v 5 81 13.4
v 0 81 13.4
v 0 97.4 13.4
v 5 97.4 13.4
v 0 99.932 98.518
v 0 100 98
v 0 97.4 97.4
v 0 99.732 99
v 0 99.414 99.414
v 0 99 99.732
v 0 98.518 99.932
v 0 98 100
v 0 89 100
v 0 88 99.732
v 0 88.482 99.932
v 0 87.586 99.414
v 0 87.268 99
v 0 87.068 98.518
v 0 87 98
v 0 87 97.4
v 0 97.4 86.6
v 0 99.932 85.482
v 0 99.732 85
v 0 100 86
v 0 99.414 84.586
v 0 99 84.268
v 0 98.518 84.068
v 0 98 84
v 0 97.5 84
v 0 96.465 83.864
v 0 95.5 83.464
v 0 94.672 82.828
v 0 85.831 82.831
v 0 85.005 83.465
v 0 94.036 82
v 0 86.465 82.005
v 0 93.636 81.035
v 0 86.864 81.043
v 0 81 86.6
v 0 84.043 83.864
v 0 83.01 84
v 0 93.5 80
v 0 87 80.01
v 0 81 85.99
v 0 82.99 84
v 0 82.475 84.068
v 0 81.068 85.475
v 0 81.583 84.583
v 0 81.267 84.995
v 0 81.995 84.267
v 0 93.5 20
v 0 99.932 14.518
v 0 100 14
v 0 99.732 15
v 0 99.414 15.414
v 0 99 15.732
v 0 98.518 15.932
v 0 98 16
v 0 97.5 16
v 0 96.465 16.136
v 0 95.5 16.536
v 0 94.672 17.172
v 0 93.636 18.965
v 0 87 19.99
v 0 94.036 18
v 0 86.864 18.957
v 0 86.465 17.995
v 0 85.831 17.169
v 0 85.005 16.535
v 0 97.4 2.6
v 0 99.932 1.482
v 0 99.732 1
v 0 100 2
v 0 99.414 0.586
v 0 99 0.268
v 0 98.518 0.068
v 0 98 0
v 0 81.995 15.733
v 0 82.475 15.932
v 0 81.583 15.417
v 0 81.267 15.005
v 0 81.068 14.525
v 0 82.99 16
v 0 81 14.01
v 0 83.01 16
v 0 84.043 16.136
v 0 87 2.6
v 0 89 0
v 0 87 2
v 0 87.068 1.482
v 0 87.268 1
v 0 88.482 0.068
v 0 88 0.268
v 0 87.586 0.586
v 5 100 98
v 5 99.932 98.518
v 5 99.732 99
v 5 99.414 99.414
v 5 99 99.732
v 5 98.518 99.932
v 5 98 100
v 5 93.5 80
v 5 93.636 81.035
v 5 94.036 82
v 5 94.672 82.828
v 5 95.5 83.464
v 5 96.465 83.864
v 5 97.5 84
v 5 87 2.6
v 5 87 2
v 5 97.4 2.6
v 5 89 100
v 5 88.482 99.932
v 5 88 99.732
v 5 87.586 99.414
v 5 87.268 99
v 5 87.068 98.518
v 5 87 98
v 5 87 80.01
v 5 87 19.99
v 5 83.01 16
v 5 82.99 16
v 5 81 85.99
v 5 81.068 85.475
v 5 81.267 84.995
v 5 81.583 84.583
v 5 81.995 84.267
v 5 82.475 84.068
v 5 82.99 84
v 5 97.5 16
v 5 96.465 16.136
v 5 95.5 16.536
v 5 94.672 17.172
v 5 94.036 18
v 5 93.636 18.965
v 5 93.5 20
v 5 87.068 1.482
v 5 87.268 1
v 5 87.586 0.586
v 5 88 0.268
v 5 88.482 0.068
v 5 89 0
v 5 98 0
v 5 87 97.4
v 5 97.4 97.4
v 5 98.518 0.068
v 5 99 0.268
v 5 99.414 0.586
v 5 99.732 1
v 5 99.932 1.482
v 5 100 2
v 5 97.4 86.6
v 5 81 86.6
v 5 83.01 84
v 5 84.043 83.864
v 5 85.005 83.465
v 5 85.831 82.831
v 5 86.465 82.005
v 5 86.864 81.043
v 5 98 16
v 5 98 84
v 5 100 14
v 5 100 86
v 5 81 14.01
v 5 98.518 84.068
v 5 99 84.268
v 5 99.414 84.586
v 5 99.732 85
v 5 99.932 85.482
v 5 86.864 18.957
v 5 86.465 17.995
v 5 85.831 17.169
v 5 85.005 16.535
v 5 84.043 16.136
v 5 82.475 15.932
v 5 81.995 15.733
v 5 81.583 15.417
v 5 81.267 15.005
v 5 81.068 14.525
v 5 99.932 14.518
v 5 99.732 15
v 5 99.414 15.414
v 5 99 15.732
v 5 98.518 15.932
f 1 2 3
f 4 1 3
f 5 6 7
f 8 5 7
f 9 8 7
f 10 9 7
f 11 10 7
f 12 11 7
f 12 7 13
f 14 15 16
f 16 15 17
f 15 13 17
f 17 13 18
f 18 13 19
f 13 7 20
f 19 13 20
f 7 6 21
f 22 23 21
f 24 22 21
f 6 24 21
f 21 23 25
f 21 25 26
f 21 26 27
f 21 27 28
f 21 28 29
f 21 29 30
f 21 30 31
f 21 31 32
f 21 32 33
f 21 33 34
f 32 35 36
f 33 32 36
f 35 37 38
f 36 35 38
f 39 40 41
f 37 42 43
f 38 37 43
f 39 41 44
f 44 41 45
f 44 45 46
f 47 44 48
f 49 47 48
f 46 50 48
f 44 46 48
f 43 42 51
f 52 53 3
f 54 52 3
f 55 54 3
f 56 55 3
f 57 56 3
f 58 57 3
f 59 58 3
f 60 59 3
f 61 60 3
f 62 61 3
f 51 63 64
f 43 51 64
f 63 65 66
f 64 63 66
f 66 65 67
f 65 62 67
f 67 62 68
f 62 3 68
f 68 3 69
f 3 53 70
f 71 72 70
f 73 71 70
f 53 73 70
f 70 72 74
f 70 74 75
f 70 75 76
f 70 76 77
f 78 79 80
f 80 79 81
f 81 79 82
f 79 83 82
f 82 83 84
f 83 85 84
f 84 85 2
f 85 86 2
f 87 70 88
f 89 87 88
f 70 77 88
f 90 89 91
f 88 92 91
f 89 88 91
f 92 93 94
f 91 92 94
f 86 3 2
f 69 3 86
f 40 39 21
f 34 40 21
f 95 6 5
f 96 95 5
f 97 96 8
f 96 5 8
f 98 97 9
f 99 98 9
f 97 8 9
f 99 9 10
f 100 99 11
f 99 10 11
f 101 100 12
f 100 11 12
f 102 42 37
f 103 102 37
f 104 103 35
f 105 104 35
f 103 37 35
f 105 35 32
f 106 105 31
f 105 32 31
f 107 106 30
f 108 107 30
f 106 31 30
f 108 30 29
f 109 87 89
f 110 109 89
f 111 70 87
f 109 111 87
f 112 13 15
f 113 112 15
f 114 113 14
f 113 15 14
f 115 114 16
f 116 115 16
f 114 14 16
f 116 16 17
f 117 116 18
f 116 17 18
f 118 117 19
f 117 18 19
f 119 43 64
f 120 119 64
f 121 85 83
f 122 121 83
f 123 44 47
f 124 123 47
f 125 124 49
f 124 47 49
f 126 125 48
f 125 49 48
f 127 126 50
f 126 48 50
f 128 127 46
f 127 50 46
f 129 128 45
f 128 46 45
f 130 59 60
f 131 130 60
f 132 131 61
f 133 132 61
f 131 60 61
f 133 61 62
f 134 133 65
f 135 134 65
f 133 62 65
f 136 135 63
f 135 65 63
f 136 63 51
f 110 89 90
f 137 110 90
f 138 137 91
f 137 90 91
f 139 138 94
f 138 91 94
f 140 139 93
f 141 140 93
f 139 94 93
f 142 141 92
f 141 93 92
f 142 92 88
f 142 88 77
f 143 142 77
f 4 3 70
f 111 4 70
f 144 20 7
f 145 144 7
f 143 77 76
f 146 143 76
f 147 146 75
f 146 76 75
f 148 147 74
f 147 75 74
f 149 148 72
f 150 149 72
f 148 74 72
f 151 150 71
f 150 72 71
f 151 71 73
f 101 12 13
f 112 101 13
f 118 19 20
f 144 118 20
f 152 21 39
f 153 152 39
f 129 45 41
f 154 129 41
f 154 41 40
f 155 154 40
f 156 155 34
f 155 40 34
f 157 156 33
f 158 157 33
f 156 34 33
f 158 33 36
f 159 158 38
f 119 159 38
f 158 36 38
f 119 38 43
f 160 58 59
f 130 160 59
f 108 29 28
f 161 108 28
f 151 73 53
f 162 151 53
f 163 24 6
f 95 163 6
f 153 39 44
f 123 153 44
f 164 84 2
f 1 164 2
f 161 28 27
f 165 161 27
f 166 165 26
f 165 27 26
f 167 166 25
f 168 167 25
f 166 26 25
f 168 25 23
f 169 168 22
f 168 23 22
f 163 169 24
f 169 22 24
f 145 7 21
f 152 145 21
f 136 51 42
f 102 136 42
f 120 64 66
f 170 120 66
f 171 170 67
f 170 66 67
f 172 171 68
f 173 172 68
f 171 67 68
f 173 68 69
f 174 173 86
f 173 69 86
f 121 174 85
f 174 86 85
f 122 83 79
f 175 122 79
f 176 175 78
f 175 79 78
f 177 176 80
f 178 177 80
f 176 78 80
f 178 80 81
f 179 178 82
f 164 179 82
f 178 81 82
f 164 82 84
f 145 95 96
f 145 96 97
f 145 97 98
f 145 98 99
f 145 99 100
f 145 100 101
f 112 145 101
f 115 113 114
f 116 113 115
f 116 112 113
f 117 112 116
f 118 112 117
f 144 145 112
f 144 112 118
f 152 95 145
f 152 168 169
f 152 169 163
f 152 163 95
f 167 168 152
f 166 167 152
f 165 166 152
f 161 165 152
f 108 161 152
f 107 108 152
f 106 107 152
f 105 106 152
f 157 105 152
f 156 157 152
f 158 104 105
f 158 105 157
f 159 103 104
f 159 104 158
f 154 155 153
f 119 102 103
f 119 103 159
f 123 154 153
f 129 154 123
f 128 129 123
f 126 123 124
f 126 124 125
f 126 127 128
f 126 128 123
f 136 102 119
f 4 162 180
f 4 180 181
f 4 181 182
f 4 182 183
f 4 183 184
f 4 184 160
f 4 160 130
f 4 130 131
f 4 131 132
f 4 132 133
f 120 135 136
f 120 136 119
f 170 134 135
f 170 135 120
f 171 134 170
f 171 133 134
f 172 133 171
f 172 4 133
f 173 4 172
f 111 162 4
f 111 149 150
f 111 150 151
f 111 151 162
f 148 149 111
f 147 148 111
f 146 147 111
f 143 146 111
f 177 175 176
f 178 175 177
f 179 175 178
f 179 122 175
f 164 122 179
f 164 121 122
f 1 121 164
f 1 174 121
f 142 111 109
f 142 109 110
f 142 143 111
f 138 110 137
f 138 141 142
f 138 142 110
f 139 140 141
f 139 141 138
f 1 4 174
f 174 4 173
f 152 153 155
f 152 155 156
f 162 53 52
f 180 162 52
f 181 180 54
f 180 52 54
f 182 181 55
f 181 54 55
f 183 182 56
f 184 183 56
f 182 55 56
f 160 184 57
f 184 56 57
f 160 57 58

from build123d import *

# Parameters (mm, degrees)
BOSS_EXTRUDE1_DEPTH = 5


with BuildPart() as part:
    # Sketch1 → Boss-Extrude1 (new body)
    with BuildSketch(Plane(origin=(0, 0, 0), x_dir=(0, -1, 0), z_dir=(1, 0, 0))):
        with BuildLine():
            Line((-81, -13.4), (-87, -13.4))
            Line((-87, -13.4), (-97.4, -13.4))
            Line((-97.4, -13.4), (-97.4, -2.6))
            Line((-97.4, -2.6), (-87, -2.6))
            Line((-87, -2.6), (-87, -2))
            ThreePointArc((-87, -2), (-87.585786438, -0.585786438), (-89, 0))
            Line((-89, 0), (-98, 0))
            ThreePointArc((-98, 0), (-99.414213562, -0.585786438), (-100, -2))
            Line((-100, -2), (-100, -14))
            ThreePointArc((-100, -14), (-99.414213562, -15.414213562), (-98, -16))
            Line((-98, -16), (-97.5, -16))
            ThreePointArc((-97.5, -16), (-94.671572875, -17.171572875), (-93.5, -20))
            Line((-93.5, -20), (-93.5, -80))
            ThreePointArc((-93.5, -80), (-94.671572875, -82.828427125), (-97.5, -84))
            Line((-97.5, -84), (-98, -84))
            ThreePointArc((-98, -84), (-99.414213562, -84.585786438), (-100, -86))
            Line((-100, -86), (-100, -98))
            ThreePointArc((-100, -98), (-99.414213562, -99.414213562), (-98, -100))
            Line((-98, -100), (-89, -100))
            ThreePointArc((-89, -100), (-87.585786438, -99.414213562), (-87, -98))
            Line((-87, -98), (-87, -97.4))
            Line((-87, -97.4), (-97.4, -97.4))
            Line((-97.4, -97.4), (-97.4, -86.6))
            Line((-97.4, -86.6), (-87, -86.6))
            Line((-87, -86.6), (-81, -86.6))
            Line((-81, -86.6), (-81, -86))
            Line((-81, -86), (-81, -85.99))
            ThreePointArc((-81, -85.99), (-81.582857505, -84.582857505), (-82.99, -84))
            Line((-82.99, -84), (-83, -84))
            Line((-83, -84), (-83.01, -84))
            ThreePointArc((-83.01, -84), (-85.831356057, -82.831356057), (-87, -80.01))
            Line((-87, -80.01), (-87, -80))
            Line((-87, -80), (-87, -20))
            Line((-87, -20), (-87, -19.99))
            ThreePointArc((-87, -19.99), (-85.831356057, -17.168643943), (-83.01, -16))
            Line((-83.01, -16), (-83, -16))
            Line((-83, -16), (-82.99, -16))
            ThreePointArc((-82.99, -16), (-81.582857505, -15.417142495), (-81, -14.01))
            Line((-81, -14.01), (-81, -14))
            Line((-81, -14), (-81, -13.4))
        make_face()
    extrude(amount=BOSS_EXTRUDE1_DEPTH)


solid = part.part
